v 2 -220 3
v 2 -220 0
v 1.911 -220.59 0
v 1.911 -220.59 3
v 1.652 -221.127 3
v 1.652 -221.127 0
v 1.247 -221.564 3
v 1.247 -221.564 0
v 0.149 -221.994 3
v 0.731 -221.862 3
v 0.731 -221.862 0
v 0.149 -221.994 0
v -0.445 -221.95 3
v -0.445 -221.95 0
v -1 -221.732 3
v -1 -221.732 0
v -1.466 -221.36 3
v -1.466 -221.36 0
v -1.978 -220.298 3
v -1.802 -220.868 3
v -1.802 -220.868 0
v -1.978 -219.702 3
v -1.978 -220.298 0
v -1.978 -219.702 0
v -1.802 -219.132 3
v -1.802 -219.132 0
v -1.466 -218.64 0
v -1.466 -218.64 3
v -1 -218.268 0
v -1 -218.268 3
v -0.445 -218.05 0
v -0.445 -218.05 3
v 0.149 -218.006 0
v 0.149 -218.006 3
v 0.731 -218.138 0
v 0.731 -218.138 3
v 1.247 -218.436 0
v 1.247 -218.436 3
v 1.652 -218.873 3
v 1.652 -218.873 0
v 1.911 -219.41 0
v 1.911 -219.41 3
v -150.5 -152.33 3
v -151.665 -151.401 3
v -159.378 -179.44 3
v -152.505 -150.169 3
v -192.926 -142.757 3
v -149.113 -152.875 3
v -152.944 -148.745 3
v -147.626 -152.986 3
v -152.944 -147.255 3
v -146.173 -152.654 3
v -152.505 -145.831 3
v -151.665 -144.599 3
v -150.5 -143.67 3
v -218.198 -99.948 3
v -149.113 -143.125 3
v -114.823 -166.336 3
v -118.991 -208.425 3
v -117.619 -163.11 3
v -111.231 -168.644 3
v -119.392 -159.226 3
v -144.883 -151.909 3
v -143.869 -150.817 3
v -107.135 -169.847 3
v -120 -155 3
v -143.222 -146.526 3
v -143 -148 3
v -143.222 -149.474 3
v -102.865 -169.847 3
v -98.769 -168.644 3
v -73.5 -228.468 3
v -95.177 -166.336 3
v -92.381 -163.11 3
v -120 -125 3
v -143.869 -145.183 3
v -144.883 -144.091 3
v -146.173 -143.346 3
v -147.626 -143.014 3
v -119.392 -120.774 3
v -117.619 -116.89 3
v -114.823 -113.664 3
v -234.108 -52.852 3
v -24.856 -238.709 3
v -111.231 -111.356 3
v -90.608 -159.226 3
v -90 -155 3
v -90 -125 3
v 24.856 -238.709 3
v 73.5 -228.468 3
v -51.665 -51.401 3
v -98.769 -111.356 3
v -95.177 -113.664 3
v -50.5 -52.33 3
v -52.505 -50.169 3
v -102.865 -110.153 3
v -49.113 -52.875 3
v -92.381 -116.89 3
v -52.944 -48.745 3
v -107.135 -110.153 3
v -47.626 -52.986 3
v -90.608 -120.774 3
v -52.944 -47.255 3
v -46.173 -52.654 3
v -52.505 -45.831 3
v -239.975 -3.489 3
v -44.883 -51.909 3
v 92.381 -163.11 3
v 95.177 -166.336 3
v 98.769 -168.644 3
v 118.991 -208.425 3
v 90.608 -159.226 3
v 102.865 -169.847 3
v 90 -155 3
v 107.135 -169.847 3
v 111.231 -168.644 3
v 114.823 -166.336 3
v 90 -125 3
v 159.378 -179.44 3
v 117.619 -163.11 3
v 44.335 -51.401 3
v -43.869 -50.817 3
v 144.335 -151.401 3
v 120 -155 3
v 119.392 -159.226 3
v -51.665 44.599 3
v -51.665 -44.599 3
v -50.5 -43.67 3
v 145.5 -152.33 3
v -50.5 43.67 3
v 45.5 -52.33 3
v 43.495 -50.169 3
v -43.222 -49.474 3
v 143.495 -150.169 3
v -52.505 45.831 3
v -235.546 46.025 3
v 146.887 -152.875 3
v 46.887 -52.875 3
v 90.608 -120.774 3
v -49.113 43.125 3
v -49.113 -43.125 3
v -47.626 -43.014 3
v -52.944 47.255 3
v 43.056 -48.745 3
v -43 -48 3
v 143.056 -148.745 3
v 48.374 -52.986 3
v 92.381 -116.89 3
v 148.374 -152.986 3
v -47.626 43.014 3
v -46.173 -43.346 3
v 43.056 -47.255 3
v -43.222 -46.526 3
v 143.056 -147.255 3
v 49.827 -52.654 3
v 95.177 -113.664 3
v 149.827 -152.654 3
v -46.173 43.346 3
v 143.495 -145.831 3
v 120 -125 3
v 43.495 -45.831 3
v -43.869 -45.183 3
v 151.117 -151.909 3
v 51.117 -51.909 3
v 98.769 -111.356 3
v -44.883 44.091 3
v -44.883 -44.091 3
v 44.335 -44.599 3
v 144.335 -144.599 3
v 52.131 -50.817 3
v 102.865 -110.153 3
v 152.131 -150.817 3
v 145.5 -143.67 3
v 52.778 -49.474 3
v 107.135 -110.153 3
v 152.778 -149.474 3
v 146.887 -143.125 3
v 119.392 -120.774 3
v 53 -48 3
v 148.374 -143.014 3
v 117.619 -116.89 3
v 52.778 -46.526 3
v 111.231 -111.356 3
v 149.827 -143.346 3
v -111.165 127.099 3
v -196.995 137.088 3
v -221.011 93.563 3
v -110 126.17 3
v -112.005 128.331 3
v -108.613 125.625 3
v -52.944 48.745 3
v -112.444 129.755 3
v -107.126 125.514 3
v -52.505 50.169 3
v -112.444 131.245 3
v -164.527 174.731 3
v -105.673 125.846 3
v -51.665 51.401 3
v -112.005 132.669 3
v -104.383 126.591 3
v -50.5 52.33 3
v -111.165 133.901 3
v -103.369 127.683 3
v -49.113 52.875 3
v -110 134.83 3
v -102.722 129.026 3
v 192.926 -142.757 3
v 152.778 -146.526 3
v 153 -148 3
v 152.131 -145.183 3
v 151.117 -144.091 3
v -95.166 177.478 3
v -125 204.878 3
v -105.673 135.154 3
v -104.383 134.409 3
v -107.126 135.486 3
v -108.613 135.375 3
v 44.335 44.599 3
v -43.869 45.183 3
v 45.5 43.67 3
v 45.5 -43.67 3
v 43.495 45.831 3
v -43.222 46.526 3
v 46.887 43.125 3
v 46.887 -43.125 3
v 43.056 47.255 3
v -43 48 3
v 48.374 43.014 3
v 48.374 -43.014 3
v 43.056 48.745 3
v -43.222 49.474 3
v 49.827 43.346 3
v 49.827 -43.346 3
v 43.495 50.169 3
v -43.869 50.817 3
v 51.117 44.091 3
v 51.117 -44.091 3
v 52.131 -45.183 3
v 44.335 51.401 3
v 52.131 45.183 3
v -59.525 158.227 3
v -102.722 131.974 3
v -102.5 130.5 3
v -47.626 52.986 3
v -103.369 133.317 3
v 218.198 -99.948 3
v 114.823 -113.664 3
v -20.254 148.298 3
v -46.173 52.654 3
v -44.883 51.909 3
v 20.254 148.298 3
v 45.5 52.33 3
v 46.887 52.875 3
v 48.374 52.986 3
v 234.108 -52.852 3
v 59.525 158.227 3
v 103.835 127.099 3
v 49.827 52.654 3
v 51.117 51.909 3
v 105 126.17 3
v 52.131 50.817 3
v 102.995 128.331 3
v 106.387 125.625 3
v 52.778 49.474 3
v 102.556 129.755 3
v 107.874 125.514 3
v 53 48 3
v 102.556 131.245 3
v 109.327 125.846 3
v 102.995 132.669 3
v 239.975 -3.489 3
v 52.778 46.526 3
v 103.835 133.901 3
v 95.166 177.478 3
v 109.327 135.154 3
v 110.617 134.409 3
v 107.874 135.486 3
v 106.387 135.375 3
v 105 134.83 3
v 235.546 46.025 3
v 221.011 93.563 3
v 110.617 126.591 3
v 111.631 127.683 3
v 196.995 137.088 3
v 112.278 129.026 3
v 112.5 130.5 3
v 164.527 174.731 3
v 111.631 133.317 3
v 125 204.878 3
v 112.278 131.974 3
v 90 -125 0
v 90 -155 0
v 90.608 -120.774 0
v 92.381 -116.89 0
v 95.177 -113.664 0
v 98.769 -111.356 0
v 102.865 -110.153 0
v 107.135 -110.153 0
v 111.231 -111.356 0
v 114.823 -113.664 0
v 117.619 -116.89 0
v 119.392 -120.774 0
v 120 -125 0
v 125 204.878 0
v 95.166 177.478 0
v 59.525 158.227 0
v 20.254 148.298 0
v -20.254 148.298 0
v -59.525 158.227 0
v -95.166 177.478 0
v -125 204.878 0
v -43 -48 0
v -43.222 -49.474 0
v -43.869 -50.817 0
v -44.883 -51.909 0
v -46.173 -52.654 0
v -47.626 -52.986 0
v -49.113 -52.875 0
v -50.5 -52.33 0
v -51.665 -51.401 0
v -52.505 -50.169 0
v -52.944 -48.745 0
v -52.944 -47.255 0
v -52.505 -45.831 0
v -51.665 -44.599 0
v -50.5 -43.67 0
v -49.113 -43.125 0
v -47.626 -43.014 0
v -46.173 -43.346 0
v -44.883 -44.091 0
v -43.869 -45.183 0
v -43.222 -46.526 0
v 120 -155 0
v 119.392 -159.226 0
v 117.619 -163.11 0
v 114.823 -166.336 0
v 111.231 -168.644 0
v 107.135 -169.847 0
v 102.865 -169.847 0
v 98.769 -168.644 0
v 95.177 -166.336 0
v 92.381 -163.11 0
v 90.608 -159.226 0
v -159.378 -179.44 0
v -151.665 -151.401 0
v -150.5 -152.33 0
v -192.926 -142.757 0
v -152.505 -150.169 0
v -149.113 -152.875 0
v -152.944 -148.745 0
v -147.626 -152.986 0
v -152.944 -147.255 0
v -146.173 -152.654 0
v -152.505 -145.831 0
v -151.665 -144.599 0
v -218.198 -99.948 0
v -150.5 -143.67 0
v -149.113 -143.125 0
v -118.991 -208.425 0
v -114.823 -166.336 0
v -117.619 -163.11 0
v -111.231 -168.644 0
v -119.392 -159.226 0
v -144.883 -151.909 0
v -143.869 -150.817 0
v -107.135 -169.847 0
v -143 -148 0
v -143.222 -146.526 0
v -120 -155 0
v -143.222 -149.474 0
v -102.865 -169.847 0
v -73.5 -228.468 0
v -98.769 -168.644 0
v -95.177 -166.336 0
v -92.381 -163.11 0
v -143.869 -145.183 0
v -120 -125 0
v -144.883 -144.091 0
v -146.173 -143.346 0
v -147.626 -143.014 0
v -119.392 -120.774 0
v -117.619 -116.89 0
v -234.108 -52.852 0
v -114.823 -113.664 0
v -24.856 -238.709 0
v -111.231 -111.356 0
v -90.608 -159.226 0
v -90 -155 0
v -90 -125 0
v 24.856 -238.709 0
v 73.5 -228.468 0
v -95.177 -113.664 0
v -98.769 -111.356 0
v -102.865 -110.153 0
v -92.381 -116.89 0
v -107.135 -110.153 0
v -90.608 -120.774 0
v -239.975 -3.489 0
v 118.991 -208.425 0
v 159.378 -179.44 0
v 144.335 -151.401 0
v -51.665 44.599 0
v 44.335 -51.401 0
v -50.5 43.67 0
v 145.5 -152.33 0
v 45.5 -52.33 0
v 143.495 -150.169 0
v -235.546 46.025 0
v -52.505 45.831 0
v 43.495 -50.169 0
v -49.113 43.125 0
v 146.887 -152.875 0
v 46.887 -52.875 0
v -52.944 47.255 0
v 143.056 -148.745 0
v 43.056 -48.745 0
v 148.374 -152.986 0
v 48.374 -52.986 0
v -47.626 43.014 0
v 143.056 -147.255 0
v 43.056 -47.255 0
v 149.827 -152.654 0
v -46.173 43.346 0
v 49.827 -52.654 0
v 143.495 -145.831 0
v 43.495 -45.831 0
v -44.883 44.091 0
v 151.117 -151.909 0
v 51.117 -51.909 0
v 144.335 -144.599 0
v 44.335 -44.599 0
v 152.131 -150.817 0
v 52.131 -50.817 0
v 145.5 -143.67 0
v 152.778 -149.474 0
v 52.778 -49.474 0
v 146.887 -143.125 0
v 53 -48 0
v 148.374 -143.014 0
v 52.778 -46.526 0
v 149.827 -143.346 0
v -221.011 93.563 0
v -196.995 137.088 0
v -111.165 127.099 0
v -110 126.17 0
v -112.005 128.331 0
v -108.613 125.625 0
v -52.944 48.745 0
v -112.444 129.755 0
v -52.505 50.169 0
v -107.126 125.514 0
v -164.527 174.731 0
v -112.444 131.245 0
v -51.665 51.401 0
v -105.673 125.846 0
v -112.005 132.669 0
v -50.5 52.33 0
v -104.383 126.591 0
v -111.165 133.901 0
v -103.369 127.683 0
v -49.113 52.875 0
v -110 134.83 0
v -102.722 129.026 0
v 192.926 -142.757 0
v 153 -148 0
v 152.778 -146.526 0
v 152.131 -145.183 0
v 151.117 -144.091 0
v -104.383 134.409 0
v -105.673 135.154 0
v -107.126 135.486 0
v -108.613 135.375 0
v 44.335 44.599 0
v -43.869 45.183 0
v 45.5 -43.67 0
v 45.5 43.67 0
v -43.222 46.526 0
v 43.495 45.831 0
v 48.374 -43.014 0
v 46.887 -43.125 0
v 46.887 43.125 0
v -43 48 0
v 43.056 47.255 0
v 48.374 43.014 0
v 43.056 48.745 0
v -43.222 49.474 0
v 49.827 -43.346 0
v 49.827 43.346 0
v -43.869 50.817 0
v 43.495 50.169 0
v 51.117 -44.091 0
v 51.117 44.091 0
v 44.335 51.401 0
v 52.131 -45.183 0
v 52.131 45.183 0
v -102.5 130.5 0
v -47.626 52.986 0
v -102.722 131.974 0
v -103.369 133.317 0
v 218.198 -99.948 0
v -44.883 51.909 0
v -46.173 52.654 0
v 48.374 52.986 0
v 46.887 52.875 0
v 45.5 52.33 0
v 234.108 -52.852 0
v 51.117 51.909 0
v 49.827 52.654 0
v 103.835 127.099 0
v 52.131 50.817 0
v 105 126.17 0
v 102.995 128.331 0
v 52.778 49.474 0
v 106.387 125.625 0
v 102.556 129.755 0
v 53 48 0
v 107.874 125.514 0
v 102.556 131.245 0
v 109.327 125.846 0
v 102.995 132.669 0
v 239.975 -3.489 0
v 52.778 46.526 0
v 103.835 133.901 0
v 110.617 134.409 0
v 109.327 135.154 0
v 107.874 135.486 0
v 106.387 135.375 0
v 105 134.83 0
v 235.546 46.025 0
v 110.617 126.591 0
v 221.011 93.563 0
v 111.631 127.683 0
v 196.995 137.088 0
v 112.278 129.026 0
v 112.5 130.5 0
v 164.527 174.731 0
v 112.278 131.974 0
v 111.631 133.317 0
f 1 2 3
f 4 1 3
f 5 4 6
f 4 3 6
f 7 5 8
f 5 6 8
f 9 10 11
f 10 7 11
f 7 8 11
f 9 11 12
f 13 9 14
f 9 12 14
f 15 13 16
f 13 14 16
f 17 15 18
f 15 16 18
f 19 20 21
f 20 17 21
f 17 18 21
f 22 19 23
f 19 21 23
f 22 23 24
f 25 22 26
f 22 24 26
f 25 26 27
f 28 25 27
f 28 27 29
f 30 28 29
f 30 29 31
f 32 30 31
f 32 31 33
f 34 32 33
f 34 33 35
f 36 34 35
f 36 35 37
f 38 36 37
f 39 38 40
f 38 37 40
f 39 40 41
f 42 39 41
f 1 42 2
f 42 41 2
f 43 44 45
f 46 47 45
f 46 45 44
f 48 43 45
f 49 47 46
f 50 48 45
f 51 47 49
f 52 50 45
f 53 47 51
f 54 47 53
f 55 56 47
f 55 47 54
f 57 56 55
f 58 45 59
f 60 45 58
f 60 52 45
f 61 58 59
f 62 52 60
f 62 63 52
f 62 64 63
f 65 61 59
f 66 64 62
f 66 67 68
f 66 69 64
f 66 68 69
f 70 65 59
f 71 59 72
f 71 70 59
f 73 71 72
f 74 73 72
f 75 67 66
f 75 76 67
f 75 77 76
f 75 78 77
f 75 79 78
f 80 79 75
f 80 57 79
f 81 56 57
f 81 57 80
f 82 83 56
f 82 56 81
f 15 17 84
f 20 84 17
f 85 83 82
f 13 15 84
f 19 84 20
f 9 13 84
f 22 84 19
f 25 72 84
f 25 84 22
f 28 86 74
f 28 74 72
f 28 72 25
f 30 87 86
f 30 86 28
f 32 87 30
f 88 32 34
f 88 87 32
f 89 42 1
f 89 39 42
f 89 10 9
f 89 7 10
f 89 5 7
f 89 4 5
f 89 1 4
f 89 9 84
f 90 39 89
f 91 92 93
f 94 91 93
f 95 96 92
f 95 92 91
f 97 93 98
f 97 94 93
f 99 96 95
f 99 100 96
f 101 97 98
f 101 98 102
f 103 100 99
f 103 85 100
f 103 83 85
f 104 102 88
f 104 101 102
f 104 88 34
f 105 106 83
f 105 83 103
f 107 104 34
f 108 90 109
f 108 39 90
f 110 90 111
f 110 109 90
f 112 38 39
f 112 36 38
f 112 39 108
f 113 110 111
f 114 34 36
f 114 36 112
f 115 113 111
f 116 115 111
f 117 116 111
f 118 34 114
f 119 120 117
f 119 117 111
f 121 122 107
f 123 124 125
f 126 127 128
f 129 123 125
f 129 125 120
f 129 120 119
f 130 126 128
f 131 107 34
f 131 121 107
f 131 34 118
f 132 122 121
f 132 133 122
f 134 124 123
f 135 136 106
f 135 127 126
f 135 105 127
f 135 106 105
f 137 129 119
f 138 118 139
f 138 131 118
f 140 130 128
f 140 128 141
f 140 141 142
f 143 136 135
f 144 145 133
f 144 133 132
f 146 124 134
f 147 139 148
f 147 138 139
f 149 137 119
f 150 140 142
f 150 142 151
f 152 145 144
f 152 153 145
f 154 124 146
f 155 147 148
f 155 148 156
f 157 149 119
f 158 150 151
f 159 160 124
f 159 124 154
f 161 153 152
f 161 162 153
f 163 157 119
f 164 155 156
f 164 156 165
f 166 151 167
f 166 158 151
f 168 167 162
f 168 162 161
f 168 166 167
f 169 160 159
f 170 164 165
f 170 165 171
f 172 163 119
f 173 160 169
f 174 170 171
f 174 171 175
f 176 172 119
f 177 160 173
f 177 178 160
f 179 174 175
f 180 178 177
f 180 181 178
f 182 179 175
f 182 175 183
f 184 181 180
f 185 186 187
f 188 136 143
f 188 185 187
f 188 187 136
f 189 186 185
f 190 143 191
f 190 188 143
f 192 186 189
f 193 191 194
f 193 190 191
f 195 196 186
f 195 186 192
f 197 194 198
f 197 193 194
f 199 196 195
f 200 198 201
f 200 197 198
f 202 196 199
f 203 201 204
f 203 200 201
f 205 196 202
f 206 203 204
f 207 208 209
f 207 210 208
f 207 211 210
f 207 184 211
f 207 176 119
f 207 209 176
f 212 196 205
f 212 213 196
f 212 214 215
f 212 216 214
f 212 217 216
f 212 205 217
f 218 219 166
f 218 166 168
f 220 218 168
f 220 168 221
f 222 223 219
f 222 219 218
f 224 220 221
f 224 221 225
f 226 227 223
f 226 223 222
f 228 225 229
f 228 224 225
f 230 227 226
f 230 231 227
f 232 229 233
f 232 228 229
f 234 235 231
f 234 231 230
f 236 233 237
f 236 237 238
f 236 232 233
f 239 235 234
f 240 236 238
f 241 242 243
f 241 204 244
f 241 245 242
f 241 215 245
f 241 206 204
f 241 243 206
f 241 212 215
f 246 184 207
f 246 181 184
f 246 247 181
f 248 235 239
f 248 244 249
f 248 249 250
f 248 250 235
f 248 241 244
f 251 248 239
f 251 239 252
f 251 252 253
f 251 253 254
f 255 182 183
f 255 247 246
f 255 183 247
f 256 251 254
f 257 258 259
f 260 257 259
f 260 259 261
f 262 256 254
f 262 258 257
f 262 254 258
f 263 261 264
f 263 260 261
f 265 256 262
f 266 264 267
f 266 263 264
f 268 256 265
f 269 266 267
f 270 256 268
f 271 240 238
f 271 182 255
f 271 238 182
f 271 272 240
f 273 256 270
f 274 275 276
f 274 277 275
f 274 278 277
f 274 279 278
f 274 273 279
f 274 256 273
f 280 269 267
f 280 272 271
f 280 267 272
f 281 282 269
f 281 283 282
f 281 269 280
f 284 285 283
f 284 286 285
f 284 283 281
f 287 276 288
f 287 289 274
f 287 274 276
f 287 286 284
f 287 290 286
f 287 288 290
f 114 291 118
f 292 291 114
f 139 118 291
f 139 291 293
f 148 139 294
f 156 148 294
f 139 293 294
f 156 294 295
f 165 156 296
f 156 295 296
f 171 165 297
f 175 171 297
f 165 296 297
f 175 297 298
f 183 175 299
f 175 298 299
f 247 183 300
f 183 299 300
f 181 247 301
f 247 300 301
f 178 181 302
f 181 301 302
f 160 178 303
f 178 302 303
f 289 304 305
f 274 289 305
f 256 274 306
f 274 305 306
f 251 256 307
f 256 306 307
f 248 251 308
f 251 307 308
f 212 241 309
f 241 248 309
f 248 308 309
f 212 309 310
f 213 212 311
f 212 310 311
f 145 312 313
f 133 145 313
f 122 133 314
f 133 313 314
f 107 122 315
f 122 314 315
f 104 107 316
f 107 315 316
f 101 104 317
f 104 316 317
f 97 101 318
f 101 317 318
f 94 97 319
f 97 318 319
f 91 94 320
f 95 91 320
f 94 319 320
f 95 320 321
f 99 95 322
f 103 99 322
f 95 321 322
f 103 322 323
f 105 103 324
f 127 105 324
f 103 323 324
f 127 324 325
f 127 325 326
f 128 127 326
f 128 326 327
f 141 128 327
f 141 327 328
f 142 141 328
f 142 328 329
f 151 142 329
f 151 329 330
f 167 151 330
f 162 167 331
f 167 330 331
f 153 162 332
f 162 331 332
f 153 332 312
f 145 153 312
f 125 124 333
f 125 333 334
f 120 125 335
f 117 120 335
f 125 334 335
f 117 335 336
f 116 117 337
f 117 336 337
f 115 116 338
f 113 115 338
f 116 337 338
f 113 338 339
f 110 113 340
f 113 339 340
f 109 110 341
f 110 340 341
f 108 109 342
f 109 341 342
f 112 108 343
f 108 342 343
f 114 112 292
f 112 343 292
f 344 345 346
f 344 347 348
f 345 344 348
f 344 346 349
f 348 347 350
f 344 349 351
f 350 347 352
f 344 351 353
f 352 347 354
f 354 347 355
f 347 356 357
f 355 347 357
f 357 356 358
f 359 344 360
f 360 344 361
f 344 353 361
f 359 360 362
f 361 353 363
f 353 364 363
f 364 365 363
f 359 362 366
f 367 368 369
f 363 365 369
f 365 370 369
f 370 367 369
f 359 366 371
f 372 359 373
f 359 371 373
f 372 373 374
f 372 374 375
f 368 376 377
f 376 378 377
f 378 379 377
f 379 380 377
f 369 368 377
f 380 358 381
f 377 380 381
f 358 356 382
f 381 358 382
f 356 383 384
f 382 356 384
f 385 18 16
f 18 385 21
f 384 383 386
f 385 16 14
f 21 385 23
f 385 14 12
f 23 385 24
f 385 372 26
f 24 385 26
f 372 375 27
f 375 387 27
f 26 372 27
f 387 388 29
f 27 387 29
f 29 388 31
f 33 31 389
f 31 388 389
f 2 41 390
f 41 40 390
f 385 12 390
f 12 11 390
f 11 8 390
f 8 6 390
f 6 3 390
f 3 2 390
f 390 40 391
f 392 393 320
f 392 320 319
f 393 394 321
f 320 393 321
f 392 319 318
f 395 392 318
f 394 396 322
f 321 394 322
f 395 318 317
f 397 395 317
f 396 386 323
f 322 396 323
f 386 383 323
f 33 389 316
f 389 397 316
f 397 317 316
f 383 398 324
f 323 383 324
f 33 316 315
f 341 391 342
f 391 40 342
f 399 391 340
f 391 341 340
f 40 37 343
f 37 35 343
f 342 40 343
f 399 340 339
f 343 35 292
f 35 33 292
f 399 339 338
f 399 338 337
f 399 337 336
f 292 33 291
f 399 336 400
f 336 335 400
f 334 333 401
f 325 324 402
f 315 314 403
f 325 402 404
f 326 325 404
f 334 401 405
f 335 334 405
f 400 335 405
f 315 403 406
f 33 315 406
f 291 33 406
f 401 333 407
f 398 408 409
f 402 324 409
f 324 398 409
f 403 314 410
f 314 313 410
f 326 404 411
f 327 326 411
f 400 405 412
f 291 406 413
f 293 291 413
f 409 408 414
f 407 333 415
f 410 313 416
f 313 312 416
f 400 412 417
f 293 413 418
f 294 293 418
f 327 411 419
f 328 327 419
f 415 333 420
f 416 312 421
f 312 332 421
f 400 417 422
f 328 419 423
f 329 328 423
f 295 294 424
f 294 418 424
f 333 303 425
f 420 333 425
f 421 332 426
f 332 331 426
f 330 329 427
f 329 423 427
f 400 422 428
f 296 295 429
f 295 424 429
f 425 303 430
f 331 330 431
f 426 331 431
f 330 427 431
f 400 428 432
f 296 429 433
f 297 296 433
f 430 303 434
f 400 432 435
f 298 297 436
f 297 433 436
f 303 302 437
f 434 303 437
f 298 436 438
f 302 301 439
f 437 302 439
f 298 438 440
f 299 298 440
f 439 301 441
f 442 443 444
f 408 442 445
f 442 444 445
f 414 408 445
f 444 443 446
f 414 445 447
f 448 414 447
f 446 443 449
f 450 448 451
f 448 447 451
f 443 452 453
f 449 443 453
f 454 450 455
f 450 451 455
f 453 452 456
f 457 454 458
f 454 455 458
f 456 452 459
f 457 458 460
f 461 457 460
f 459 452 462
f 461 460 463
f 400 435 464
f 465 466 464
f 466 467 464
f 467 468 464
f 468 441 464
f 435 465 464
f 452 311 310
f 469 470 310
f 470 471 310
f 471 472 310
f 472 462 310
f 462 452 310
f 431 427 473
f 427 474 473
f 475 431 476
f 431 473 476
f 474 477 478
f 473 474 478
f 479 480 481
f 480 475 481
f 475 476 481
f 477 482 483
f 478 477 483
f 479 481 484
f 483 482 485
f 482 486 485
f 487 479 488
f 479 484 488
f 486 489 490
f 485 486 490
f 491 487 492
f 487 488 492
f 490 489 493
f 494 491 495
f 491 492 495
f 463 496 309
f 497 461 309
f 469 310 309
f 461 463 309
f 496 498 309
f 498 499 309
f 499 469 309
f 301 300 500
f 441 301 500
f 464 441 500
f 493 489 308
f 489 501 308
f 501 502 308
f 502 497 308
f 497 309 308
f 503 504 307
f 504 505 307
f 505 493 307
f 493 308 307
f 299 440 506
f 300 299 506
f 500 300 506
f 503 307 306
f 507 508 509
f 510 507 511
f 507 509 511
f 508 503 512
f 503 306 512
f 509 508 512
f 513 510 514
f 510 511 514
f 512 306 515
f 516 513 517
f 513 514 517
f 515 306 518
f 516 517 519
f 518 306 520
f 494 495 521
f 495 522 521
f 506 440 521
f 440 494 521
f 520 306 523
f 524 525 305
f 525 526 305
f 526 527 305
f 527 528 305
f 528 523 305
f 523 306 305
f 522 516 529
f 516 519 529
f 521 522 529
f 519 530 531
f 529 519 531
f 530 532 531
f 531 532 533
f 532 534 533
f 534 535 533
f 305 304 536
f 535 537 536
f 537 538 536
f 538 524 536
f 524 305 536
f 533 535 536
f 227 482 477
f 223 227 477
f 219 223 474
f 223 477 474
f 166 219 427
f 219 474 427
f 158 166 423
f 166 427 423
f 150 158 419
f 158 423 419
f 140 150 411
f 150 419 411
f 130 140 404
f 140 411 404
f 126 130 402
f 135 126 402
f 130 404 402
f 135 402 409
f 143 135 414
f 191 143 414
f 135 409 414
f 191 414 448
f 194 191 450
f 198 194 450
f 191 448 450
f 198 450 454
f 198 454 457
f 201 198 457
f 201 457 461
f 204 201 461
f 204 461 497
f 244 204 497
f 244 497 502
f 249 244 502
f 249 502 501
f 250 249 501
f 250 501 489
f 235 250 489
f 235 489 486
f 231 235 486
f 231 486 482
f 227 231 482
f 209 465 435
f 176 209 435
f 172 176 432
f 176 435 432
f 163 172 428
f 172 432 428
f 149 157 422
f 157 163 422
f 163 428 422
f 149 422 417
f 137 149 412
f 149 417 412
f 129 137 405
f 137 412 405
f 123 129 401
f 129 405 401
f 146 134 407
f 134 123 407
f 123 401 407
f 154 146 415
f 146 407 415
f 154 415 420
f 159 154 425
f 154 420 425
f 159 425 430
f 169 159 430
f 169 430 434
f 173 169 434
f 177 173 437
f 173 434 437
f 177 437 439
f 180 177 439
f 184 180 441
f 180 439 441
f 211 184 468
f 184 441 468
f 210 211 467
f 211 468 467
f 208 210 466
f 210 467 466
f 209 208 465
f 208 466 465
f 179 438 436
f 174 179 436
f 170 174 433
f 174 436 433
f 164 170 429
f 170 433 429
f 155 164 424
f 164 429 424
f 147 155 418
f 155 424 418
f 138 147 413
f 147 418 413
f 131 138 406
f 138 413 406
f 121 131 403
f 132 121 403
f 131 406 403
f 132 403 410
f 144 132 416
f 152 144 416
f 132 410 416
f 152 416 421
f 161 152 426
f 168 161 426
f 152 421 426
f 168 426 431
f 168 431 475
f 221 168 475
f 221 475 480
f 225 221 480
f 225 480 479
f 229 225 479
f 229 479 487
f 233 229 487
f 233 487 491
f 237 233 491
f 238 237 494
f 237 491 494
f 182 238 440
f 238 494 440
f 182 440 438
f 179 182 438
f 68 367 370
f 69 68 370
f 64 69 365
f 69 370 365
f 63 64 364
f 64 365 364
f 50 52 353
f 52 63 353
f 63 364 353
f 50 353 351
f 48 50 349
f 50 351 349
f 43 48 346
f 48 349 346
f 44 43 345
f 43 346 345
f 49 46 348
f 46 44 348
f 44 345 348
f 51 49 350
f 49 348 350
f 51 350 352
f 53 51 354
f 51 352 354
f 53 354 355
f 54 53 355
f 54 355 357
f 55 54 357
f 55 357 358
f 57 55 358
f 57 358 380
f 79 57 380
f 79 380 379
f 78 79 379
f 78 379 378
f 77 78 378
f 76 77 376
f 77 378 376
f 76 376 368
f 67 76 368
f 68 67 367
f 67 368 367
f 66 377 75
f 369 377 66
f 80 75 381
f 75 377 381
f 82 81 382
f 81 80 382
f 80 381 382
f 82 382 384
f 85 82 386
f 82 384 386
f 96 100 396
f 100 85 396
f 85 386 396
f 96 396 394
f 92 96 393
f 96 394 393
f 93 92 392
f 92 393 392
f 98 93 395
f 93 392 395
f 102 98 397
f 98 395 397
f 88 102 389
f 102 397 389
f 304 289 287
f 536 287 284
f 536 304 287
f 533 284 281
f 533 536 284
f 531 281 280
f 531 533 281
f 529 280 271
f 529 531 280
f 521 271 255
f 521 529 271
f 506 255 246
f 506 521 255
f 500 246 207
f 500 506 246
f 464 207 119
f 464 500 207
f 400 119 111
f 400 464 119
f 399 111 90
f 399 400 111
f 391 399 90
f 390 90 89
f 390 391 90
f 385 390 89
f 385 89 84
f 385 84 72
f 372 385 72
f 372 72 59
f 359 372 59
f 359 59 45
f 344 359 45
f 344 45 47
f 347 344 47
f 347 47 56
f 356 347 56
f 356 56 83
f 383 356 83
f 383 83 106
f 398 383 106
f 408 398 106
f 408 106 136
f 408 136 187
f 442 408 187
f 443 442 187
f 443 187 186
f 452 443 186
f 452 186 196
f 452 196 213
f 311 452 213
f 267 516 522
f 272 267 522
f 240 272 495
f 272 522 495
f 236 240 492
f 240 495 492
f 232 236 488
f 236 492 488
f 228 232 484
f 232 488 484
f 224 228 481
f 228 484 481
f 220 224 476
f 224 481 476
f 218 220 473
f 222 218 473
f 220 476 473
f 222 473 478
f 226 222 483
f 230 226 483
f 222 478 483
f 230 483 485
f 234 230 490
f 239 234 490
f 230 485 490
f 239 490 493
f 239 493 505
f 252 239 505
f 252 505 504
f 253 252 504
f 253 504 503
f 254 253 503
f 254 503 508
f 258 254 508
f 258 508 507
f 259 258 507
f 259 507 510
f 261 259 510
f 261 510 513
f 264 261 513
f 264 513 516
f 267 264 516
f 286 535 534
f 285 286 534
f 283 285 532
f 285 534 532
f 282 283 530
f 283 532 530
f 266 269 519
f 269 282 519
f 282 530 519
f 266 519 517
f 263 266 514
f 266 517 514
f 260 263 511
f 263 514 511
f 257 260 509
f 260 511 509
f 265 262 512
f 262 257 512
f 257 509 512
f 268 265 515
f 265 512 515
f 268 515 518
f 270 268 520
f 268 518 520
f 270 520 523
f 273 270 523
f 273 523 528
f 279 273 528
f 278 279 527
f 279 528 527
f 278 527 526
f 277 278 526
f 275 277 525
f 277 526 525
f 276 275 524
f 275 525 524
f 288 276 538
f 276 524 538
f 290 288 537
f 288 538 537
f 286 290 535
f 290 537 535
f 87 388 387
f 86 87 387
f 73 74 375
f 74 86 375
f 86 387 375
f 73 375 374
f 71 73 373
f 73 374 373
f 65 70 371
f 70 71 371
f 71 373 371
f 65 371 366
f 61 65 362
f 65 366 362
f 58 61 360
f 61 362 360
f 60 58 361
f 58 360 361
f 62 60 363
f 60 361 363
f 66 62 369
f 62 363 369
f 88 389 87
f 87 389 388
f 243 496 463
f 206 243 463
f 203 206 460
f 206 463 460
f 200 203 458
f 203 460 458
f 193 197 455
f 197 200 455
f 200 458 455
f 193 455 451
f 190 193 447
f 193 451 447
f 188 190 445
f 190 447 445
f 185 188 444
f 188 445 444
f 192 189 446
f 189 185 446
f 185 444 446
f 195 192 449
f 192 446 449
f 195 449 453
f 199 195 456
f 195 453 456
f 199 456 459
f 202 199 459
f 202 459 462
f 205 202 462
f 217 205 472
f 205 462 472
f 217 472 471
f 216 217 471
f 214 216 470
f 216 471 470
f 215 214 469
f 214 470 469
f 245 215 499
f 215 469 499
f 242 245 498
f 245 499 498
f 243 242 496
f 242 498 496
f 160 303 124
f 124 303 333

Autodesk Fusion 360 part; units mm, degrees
sketch "Esboço1" plane through (0, 0, 0) normal (0, 0, 1) x (1, 0, 0)
  circle A0 centre (0, 0) radius 240
  line L0 (48, -48) -> (-48, -48)
  line L1 (-48, -48) -> (-48, 48)
  line L2 (-48, 48) -> (48, 48)
  line L3 (48, 48) -> (48, -48)
  line L4 (48, -48) -> (-48, 48) construction
  line L5 (-48, -48) -> (48, 48) construction
  circle A1 centre (-48, 48) radius 5
  circle A2 centre (-48, -48) radius 5
  circle A3 centre (48, 48) radius 5
  circle A4 centre (48, -48) radius 5
  line L6 (105, -110) -> (105, -170)
  line L7 (90, -125) -> (90, -155)
  line L8 (120, -125) -> (120, -155)
  arc A5 (120, -125) -> (90, -125) centre (105, -125) ccw
  arc A6 (90, -155) -> (120, -155) centre (105, -155) ccw
  circle A7 centre (148, -148) radius 5
  line L9 (-125, 204.878) -> (125, 204.878)
  circle A8 centre (0, 311.043) radius 164
  circle A9 centre (107.5, 130.5) radius 5
  line L10 (-40, 115) -> (40, 115)
  line L11 (-40, 115) -> (-40, 151.9958)
  line L12 (40, 115) -> (40, 151.9958)
  line L13 (0, 1.75) -> (0, 22.5)
  line L14 (-120, -125) -> (-120, -155)
  arc A10 (-90, -125) -> (-120, -125) centre (-105, -125) ccw
  line L15 (-90, -125) -> (-90, -155)
  arc A11 (-120, -155) -> (-90, -155) centre (-105, -155) ccw
  circle A12 centre (-148, -148) radius 5
  circle A13 centre (-107.5, 130.5) radius 5
  circle A14 centre (0, -220) radius 2
  point P0 (105, -110)
  point P1 (0, 115)
  dimension "d1" = 480
  dimension "d2" = 96
  dimension "d3" = 96
  dimension "d4" = 10
  dimension "d5" = 10
  dimension "d6" = 10
  dimension "d7" = 10
  dimension "d8" = 110
  dimension "d9" = 105
  dimension "d10" = 30
  dimension "d11" = 60
  dimension "d12" = 30
  dimension "d13" = 10
  dimension "d14" = 148
  dimension "d15" = 148
  dimension "d16" = 250
  dimension "d17" = 328
  dimension "d18" = 10
  dimension "d19" = 130.5
  dimension "d20" = 107.5
  dimension "d21" = 115
  dimension "d22" = 80
  dimension "d23" = 4
  dimension "d24" = 220
extrude "Extrusão1" add sketch "Esboço1" along normal blind 3 contours A0 A8 L10 L11 L12 | A8 L10 L11 L12 | L0 L1 L2 L3 A1 A2 A3 A4
equation "d12 = d10"
equation "d17 = ( 164 * 2 ) * 1 mm"
equation "d24 = d1 / 2 - 20 mm"
